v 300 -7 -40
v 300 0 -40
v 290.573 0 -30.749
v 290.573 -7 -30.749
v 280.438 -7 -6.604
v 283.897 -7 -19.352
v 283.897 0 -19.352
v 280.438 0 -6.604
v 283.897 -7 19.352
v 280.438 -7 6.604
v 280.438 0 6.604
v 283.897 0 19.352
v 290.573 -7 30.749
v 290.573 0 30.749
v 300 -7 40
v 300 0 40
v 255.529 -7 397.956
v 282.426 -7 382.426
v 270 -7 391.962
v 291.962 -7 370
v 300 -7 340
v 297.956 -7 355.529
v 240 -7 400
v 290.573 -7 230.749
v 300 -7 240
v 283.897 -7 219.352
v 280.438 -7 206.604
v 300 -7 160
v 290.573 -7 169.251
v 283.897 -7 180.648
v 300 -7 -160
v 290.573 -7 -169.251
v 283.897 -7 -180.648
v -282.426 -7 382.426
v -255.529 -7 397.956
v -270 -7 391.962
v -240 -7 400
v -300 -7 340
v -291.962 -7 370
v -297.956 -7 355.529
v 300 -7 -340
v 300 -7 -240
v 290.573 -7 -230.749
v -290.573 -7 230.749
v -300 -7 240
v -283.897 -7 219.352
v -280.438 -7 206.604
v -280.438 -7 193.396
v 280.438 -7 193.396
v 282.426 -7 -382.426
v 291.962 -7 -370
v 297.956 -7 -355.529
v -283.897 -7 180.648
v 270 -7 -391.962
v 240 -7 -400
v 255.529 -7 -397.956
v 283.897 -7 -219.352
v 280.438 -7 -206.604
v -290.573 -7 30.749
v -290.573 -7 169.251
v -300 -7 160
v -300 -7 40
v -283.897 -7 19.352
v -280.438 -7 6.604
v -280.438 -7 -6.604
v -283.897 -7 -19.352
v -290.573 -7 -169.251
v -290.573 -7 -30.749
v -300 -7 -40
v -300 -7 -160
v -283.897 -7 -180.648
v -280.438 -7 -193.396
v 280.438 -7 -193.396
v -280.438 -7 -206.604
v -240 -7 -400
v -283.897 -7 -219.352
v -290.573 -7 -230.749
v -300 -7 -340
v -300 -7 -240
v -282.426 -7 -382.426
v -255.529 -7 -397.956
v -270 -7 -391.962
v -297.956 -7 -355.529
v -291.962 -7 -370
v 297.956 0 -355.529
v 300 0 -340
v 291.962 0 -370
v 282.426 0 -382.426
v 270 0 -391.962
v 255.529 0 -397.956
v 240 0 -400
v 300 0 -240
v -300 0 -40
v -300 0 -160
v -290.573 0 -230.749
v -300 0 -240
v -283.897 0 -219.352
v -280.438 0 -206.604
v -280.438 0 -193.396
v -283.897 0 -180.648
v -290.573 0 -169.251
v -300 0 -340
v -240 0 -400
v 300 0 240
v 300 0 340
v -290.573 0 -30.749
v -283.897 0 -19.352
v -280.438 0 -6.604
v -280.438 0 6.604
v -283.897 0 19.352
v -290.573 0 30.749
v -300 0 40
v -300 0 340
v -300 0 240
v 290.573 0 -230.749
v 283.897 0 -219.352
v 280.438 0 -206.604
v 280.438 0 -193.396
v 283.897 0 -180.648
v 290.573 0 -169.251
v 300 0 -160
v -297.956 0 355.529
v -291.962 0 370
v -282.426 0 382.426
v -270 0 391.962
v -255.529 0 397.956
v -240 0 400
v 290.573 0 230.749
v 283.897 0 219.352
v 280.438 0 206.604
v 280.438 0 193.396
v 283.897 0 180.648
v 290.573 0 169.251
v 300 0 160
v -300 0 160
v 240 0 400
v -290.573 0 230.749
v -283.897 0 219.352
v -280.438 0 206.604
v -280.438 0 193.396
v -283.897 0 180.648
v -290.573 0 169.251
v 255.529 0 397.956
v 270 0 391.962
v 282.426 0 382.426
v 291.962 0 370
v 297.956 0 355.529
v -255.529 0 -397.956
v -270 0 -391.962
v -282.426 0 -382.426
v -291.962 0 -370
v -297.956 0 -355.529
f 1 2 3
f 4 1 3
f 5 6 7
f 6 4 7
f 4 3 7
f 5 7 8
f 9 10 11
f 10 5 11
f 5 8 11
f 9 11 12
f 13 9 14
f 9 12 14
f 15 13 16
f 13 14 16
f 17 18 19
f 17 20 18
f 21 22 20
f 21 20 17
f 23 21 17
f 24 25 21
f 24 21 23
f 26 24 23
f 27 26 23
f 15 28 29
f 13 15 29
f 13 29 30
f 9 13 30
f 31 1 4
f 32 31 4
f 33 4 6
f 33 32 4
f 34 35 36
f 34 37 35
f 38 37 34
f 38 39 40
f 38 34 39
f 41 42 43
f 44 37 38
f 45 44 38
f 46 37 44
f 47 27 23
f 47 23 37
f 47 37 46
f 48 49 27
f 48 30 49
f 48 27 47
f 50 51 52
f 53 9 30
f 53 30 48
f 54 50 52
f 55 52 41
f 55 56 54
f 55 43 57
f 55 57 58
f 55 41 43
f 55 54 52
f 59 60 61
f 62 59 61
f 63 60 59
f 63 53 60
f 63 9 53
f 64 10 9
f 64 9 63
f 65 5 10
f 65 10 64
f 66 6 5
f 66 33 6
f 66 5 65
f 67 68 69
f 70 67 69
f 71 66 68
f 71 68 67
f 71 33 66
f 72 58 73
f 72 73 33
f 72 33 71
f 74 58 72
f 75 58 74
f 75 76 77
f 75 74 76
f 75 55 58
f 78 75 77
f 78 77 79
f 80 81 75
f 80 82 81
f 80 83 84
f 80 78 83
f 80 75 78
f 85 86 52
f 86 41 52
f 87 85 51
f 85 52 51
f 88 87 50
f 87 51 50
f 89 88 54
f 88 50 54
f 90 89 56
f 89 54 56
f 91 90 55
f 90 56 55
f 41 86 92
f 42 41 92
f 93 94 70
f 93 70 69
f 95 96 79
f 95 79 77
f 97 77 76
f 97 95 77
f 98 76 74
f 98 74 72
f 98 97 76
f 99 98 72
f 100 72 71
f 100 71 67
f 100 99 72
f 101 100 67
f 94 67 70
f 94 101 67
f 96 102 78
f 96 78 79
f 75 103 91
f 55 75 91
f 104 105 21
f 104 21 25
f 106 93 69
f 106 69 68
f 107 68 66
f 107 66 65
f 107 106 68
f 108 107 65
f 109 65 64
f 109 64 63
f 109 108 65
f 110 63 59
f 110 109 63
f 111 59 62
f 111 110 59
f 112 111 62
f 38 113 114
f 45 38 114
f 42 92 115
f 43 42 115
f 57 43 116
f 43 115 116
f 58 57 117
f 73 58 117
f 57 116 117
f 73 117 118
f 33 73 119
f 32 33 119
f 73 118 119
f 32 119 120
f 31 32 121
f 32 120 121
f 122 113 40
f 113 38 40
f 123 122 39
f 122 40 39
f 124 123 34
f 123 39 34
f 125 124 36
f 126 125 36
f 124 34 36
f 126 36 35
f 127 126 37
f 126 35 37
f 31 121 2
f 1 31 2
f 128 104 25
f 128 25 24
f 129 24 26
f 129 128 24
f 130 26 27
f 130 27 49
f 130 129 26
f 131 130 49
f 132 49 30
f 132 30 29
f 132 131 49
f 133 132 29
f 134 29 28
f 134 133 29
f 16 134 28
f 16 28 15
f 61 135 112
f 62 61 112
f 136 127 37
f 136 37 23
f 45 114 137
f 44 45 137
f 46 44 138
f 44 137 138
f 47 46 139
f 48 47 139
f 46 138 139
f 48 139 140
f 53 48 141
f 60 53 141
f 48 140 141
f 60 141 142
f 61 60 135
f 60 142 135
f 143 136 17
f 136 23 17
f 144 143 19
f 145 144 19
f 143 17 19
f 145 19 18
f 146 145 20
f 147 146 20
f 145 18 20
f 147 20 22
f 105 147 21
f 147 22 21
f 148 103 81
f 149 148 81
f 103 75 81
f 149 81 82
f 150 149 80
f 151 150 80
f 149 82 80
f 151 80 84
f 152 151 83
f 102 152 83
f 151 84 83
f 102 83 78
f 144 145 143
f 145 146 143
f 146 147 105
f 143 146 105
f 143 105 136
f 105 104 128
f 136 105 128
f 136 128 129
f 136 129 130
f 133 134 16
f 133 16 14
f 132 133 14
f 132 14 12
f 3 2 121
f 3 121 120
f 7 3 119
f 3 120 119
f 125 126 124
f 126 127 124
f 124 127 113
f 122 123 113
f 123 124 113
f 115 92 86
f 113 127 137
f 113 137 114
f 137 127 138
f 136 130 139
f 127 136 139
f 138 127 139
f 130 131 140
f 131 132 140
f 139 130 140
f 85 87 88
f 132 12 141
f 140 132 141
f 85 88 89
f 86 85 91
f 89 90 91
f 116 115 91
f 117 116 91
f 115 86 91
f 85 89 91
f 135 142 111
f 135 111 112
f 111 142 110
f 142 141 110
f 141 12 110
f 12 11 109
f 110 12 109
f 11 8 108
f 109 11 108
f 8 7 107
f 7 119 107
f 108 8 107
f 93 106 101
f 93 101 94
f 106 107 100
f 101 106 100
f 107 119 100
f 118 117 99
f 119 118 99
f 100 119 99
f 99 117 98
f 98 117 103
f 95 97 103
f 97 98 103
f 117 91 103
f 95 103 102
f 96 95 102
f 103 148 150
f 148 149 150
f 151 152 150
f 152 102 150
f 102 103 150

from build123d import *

# Parameters (mm, degrees)
F1_DEPTH = 7
F4_R     = 60


with BuildPart() as f1:
    # F0 (on Front) → F1 (new body)
    with BuildSketch(Plane.XZ):
        with BuildLine():
            Line((-280, 0), (0, 0))
            Line((0, 0), (0, 400))
            Line((0, 400), (-300, 400))
            Line((-300, 400), (-300, 240))
            ThreePointArc((-300, 240), (-285.27864045, 222.360679775), (-280, 200))
            ThreePointArc((-280, 200), (-285.27864045, 177.639320225), (-300, 160))
            Line((-300, 160), (-300, 40))
            ThreePointArc((-300, 40), (-285.27864045, 22.360679775), (-280, 0))
        make_face()
    extrude(amount=F1_DEPTH)

    # F2: F1 across plane


with BuildPart() as f1_1:
    add(f1.part)
    add(f1.part.mirror(Plane.YZ))

    # F3: F1 across plane


with BuildPart() as f1_2:
    add(f1_1.part)
    add(f1_1.part.mirror(Plane.XY))

    # F4
    f4_edges = [f1_2.edges().sort_by_distance(p)[0] for p in [
        (-300, -3.5, 400),
        (300, -3.5, 400),
        (300, -3.5, -400),
        (-300, -3.5, -400),
    ]]
    fillet(f4_edges, radius=F4_R)


solid = f1_2.part
